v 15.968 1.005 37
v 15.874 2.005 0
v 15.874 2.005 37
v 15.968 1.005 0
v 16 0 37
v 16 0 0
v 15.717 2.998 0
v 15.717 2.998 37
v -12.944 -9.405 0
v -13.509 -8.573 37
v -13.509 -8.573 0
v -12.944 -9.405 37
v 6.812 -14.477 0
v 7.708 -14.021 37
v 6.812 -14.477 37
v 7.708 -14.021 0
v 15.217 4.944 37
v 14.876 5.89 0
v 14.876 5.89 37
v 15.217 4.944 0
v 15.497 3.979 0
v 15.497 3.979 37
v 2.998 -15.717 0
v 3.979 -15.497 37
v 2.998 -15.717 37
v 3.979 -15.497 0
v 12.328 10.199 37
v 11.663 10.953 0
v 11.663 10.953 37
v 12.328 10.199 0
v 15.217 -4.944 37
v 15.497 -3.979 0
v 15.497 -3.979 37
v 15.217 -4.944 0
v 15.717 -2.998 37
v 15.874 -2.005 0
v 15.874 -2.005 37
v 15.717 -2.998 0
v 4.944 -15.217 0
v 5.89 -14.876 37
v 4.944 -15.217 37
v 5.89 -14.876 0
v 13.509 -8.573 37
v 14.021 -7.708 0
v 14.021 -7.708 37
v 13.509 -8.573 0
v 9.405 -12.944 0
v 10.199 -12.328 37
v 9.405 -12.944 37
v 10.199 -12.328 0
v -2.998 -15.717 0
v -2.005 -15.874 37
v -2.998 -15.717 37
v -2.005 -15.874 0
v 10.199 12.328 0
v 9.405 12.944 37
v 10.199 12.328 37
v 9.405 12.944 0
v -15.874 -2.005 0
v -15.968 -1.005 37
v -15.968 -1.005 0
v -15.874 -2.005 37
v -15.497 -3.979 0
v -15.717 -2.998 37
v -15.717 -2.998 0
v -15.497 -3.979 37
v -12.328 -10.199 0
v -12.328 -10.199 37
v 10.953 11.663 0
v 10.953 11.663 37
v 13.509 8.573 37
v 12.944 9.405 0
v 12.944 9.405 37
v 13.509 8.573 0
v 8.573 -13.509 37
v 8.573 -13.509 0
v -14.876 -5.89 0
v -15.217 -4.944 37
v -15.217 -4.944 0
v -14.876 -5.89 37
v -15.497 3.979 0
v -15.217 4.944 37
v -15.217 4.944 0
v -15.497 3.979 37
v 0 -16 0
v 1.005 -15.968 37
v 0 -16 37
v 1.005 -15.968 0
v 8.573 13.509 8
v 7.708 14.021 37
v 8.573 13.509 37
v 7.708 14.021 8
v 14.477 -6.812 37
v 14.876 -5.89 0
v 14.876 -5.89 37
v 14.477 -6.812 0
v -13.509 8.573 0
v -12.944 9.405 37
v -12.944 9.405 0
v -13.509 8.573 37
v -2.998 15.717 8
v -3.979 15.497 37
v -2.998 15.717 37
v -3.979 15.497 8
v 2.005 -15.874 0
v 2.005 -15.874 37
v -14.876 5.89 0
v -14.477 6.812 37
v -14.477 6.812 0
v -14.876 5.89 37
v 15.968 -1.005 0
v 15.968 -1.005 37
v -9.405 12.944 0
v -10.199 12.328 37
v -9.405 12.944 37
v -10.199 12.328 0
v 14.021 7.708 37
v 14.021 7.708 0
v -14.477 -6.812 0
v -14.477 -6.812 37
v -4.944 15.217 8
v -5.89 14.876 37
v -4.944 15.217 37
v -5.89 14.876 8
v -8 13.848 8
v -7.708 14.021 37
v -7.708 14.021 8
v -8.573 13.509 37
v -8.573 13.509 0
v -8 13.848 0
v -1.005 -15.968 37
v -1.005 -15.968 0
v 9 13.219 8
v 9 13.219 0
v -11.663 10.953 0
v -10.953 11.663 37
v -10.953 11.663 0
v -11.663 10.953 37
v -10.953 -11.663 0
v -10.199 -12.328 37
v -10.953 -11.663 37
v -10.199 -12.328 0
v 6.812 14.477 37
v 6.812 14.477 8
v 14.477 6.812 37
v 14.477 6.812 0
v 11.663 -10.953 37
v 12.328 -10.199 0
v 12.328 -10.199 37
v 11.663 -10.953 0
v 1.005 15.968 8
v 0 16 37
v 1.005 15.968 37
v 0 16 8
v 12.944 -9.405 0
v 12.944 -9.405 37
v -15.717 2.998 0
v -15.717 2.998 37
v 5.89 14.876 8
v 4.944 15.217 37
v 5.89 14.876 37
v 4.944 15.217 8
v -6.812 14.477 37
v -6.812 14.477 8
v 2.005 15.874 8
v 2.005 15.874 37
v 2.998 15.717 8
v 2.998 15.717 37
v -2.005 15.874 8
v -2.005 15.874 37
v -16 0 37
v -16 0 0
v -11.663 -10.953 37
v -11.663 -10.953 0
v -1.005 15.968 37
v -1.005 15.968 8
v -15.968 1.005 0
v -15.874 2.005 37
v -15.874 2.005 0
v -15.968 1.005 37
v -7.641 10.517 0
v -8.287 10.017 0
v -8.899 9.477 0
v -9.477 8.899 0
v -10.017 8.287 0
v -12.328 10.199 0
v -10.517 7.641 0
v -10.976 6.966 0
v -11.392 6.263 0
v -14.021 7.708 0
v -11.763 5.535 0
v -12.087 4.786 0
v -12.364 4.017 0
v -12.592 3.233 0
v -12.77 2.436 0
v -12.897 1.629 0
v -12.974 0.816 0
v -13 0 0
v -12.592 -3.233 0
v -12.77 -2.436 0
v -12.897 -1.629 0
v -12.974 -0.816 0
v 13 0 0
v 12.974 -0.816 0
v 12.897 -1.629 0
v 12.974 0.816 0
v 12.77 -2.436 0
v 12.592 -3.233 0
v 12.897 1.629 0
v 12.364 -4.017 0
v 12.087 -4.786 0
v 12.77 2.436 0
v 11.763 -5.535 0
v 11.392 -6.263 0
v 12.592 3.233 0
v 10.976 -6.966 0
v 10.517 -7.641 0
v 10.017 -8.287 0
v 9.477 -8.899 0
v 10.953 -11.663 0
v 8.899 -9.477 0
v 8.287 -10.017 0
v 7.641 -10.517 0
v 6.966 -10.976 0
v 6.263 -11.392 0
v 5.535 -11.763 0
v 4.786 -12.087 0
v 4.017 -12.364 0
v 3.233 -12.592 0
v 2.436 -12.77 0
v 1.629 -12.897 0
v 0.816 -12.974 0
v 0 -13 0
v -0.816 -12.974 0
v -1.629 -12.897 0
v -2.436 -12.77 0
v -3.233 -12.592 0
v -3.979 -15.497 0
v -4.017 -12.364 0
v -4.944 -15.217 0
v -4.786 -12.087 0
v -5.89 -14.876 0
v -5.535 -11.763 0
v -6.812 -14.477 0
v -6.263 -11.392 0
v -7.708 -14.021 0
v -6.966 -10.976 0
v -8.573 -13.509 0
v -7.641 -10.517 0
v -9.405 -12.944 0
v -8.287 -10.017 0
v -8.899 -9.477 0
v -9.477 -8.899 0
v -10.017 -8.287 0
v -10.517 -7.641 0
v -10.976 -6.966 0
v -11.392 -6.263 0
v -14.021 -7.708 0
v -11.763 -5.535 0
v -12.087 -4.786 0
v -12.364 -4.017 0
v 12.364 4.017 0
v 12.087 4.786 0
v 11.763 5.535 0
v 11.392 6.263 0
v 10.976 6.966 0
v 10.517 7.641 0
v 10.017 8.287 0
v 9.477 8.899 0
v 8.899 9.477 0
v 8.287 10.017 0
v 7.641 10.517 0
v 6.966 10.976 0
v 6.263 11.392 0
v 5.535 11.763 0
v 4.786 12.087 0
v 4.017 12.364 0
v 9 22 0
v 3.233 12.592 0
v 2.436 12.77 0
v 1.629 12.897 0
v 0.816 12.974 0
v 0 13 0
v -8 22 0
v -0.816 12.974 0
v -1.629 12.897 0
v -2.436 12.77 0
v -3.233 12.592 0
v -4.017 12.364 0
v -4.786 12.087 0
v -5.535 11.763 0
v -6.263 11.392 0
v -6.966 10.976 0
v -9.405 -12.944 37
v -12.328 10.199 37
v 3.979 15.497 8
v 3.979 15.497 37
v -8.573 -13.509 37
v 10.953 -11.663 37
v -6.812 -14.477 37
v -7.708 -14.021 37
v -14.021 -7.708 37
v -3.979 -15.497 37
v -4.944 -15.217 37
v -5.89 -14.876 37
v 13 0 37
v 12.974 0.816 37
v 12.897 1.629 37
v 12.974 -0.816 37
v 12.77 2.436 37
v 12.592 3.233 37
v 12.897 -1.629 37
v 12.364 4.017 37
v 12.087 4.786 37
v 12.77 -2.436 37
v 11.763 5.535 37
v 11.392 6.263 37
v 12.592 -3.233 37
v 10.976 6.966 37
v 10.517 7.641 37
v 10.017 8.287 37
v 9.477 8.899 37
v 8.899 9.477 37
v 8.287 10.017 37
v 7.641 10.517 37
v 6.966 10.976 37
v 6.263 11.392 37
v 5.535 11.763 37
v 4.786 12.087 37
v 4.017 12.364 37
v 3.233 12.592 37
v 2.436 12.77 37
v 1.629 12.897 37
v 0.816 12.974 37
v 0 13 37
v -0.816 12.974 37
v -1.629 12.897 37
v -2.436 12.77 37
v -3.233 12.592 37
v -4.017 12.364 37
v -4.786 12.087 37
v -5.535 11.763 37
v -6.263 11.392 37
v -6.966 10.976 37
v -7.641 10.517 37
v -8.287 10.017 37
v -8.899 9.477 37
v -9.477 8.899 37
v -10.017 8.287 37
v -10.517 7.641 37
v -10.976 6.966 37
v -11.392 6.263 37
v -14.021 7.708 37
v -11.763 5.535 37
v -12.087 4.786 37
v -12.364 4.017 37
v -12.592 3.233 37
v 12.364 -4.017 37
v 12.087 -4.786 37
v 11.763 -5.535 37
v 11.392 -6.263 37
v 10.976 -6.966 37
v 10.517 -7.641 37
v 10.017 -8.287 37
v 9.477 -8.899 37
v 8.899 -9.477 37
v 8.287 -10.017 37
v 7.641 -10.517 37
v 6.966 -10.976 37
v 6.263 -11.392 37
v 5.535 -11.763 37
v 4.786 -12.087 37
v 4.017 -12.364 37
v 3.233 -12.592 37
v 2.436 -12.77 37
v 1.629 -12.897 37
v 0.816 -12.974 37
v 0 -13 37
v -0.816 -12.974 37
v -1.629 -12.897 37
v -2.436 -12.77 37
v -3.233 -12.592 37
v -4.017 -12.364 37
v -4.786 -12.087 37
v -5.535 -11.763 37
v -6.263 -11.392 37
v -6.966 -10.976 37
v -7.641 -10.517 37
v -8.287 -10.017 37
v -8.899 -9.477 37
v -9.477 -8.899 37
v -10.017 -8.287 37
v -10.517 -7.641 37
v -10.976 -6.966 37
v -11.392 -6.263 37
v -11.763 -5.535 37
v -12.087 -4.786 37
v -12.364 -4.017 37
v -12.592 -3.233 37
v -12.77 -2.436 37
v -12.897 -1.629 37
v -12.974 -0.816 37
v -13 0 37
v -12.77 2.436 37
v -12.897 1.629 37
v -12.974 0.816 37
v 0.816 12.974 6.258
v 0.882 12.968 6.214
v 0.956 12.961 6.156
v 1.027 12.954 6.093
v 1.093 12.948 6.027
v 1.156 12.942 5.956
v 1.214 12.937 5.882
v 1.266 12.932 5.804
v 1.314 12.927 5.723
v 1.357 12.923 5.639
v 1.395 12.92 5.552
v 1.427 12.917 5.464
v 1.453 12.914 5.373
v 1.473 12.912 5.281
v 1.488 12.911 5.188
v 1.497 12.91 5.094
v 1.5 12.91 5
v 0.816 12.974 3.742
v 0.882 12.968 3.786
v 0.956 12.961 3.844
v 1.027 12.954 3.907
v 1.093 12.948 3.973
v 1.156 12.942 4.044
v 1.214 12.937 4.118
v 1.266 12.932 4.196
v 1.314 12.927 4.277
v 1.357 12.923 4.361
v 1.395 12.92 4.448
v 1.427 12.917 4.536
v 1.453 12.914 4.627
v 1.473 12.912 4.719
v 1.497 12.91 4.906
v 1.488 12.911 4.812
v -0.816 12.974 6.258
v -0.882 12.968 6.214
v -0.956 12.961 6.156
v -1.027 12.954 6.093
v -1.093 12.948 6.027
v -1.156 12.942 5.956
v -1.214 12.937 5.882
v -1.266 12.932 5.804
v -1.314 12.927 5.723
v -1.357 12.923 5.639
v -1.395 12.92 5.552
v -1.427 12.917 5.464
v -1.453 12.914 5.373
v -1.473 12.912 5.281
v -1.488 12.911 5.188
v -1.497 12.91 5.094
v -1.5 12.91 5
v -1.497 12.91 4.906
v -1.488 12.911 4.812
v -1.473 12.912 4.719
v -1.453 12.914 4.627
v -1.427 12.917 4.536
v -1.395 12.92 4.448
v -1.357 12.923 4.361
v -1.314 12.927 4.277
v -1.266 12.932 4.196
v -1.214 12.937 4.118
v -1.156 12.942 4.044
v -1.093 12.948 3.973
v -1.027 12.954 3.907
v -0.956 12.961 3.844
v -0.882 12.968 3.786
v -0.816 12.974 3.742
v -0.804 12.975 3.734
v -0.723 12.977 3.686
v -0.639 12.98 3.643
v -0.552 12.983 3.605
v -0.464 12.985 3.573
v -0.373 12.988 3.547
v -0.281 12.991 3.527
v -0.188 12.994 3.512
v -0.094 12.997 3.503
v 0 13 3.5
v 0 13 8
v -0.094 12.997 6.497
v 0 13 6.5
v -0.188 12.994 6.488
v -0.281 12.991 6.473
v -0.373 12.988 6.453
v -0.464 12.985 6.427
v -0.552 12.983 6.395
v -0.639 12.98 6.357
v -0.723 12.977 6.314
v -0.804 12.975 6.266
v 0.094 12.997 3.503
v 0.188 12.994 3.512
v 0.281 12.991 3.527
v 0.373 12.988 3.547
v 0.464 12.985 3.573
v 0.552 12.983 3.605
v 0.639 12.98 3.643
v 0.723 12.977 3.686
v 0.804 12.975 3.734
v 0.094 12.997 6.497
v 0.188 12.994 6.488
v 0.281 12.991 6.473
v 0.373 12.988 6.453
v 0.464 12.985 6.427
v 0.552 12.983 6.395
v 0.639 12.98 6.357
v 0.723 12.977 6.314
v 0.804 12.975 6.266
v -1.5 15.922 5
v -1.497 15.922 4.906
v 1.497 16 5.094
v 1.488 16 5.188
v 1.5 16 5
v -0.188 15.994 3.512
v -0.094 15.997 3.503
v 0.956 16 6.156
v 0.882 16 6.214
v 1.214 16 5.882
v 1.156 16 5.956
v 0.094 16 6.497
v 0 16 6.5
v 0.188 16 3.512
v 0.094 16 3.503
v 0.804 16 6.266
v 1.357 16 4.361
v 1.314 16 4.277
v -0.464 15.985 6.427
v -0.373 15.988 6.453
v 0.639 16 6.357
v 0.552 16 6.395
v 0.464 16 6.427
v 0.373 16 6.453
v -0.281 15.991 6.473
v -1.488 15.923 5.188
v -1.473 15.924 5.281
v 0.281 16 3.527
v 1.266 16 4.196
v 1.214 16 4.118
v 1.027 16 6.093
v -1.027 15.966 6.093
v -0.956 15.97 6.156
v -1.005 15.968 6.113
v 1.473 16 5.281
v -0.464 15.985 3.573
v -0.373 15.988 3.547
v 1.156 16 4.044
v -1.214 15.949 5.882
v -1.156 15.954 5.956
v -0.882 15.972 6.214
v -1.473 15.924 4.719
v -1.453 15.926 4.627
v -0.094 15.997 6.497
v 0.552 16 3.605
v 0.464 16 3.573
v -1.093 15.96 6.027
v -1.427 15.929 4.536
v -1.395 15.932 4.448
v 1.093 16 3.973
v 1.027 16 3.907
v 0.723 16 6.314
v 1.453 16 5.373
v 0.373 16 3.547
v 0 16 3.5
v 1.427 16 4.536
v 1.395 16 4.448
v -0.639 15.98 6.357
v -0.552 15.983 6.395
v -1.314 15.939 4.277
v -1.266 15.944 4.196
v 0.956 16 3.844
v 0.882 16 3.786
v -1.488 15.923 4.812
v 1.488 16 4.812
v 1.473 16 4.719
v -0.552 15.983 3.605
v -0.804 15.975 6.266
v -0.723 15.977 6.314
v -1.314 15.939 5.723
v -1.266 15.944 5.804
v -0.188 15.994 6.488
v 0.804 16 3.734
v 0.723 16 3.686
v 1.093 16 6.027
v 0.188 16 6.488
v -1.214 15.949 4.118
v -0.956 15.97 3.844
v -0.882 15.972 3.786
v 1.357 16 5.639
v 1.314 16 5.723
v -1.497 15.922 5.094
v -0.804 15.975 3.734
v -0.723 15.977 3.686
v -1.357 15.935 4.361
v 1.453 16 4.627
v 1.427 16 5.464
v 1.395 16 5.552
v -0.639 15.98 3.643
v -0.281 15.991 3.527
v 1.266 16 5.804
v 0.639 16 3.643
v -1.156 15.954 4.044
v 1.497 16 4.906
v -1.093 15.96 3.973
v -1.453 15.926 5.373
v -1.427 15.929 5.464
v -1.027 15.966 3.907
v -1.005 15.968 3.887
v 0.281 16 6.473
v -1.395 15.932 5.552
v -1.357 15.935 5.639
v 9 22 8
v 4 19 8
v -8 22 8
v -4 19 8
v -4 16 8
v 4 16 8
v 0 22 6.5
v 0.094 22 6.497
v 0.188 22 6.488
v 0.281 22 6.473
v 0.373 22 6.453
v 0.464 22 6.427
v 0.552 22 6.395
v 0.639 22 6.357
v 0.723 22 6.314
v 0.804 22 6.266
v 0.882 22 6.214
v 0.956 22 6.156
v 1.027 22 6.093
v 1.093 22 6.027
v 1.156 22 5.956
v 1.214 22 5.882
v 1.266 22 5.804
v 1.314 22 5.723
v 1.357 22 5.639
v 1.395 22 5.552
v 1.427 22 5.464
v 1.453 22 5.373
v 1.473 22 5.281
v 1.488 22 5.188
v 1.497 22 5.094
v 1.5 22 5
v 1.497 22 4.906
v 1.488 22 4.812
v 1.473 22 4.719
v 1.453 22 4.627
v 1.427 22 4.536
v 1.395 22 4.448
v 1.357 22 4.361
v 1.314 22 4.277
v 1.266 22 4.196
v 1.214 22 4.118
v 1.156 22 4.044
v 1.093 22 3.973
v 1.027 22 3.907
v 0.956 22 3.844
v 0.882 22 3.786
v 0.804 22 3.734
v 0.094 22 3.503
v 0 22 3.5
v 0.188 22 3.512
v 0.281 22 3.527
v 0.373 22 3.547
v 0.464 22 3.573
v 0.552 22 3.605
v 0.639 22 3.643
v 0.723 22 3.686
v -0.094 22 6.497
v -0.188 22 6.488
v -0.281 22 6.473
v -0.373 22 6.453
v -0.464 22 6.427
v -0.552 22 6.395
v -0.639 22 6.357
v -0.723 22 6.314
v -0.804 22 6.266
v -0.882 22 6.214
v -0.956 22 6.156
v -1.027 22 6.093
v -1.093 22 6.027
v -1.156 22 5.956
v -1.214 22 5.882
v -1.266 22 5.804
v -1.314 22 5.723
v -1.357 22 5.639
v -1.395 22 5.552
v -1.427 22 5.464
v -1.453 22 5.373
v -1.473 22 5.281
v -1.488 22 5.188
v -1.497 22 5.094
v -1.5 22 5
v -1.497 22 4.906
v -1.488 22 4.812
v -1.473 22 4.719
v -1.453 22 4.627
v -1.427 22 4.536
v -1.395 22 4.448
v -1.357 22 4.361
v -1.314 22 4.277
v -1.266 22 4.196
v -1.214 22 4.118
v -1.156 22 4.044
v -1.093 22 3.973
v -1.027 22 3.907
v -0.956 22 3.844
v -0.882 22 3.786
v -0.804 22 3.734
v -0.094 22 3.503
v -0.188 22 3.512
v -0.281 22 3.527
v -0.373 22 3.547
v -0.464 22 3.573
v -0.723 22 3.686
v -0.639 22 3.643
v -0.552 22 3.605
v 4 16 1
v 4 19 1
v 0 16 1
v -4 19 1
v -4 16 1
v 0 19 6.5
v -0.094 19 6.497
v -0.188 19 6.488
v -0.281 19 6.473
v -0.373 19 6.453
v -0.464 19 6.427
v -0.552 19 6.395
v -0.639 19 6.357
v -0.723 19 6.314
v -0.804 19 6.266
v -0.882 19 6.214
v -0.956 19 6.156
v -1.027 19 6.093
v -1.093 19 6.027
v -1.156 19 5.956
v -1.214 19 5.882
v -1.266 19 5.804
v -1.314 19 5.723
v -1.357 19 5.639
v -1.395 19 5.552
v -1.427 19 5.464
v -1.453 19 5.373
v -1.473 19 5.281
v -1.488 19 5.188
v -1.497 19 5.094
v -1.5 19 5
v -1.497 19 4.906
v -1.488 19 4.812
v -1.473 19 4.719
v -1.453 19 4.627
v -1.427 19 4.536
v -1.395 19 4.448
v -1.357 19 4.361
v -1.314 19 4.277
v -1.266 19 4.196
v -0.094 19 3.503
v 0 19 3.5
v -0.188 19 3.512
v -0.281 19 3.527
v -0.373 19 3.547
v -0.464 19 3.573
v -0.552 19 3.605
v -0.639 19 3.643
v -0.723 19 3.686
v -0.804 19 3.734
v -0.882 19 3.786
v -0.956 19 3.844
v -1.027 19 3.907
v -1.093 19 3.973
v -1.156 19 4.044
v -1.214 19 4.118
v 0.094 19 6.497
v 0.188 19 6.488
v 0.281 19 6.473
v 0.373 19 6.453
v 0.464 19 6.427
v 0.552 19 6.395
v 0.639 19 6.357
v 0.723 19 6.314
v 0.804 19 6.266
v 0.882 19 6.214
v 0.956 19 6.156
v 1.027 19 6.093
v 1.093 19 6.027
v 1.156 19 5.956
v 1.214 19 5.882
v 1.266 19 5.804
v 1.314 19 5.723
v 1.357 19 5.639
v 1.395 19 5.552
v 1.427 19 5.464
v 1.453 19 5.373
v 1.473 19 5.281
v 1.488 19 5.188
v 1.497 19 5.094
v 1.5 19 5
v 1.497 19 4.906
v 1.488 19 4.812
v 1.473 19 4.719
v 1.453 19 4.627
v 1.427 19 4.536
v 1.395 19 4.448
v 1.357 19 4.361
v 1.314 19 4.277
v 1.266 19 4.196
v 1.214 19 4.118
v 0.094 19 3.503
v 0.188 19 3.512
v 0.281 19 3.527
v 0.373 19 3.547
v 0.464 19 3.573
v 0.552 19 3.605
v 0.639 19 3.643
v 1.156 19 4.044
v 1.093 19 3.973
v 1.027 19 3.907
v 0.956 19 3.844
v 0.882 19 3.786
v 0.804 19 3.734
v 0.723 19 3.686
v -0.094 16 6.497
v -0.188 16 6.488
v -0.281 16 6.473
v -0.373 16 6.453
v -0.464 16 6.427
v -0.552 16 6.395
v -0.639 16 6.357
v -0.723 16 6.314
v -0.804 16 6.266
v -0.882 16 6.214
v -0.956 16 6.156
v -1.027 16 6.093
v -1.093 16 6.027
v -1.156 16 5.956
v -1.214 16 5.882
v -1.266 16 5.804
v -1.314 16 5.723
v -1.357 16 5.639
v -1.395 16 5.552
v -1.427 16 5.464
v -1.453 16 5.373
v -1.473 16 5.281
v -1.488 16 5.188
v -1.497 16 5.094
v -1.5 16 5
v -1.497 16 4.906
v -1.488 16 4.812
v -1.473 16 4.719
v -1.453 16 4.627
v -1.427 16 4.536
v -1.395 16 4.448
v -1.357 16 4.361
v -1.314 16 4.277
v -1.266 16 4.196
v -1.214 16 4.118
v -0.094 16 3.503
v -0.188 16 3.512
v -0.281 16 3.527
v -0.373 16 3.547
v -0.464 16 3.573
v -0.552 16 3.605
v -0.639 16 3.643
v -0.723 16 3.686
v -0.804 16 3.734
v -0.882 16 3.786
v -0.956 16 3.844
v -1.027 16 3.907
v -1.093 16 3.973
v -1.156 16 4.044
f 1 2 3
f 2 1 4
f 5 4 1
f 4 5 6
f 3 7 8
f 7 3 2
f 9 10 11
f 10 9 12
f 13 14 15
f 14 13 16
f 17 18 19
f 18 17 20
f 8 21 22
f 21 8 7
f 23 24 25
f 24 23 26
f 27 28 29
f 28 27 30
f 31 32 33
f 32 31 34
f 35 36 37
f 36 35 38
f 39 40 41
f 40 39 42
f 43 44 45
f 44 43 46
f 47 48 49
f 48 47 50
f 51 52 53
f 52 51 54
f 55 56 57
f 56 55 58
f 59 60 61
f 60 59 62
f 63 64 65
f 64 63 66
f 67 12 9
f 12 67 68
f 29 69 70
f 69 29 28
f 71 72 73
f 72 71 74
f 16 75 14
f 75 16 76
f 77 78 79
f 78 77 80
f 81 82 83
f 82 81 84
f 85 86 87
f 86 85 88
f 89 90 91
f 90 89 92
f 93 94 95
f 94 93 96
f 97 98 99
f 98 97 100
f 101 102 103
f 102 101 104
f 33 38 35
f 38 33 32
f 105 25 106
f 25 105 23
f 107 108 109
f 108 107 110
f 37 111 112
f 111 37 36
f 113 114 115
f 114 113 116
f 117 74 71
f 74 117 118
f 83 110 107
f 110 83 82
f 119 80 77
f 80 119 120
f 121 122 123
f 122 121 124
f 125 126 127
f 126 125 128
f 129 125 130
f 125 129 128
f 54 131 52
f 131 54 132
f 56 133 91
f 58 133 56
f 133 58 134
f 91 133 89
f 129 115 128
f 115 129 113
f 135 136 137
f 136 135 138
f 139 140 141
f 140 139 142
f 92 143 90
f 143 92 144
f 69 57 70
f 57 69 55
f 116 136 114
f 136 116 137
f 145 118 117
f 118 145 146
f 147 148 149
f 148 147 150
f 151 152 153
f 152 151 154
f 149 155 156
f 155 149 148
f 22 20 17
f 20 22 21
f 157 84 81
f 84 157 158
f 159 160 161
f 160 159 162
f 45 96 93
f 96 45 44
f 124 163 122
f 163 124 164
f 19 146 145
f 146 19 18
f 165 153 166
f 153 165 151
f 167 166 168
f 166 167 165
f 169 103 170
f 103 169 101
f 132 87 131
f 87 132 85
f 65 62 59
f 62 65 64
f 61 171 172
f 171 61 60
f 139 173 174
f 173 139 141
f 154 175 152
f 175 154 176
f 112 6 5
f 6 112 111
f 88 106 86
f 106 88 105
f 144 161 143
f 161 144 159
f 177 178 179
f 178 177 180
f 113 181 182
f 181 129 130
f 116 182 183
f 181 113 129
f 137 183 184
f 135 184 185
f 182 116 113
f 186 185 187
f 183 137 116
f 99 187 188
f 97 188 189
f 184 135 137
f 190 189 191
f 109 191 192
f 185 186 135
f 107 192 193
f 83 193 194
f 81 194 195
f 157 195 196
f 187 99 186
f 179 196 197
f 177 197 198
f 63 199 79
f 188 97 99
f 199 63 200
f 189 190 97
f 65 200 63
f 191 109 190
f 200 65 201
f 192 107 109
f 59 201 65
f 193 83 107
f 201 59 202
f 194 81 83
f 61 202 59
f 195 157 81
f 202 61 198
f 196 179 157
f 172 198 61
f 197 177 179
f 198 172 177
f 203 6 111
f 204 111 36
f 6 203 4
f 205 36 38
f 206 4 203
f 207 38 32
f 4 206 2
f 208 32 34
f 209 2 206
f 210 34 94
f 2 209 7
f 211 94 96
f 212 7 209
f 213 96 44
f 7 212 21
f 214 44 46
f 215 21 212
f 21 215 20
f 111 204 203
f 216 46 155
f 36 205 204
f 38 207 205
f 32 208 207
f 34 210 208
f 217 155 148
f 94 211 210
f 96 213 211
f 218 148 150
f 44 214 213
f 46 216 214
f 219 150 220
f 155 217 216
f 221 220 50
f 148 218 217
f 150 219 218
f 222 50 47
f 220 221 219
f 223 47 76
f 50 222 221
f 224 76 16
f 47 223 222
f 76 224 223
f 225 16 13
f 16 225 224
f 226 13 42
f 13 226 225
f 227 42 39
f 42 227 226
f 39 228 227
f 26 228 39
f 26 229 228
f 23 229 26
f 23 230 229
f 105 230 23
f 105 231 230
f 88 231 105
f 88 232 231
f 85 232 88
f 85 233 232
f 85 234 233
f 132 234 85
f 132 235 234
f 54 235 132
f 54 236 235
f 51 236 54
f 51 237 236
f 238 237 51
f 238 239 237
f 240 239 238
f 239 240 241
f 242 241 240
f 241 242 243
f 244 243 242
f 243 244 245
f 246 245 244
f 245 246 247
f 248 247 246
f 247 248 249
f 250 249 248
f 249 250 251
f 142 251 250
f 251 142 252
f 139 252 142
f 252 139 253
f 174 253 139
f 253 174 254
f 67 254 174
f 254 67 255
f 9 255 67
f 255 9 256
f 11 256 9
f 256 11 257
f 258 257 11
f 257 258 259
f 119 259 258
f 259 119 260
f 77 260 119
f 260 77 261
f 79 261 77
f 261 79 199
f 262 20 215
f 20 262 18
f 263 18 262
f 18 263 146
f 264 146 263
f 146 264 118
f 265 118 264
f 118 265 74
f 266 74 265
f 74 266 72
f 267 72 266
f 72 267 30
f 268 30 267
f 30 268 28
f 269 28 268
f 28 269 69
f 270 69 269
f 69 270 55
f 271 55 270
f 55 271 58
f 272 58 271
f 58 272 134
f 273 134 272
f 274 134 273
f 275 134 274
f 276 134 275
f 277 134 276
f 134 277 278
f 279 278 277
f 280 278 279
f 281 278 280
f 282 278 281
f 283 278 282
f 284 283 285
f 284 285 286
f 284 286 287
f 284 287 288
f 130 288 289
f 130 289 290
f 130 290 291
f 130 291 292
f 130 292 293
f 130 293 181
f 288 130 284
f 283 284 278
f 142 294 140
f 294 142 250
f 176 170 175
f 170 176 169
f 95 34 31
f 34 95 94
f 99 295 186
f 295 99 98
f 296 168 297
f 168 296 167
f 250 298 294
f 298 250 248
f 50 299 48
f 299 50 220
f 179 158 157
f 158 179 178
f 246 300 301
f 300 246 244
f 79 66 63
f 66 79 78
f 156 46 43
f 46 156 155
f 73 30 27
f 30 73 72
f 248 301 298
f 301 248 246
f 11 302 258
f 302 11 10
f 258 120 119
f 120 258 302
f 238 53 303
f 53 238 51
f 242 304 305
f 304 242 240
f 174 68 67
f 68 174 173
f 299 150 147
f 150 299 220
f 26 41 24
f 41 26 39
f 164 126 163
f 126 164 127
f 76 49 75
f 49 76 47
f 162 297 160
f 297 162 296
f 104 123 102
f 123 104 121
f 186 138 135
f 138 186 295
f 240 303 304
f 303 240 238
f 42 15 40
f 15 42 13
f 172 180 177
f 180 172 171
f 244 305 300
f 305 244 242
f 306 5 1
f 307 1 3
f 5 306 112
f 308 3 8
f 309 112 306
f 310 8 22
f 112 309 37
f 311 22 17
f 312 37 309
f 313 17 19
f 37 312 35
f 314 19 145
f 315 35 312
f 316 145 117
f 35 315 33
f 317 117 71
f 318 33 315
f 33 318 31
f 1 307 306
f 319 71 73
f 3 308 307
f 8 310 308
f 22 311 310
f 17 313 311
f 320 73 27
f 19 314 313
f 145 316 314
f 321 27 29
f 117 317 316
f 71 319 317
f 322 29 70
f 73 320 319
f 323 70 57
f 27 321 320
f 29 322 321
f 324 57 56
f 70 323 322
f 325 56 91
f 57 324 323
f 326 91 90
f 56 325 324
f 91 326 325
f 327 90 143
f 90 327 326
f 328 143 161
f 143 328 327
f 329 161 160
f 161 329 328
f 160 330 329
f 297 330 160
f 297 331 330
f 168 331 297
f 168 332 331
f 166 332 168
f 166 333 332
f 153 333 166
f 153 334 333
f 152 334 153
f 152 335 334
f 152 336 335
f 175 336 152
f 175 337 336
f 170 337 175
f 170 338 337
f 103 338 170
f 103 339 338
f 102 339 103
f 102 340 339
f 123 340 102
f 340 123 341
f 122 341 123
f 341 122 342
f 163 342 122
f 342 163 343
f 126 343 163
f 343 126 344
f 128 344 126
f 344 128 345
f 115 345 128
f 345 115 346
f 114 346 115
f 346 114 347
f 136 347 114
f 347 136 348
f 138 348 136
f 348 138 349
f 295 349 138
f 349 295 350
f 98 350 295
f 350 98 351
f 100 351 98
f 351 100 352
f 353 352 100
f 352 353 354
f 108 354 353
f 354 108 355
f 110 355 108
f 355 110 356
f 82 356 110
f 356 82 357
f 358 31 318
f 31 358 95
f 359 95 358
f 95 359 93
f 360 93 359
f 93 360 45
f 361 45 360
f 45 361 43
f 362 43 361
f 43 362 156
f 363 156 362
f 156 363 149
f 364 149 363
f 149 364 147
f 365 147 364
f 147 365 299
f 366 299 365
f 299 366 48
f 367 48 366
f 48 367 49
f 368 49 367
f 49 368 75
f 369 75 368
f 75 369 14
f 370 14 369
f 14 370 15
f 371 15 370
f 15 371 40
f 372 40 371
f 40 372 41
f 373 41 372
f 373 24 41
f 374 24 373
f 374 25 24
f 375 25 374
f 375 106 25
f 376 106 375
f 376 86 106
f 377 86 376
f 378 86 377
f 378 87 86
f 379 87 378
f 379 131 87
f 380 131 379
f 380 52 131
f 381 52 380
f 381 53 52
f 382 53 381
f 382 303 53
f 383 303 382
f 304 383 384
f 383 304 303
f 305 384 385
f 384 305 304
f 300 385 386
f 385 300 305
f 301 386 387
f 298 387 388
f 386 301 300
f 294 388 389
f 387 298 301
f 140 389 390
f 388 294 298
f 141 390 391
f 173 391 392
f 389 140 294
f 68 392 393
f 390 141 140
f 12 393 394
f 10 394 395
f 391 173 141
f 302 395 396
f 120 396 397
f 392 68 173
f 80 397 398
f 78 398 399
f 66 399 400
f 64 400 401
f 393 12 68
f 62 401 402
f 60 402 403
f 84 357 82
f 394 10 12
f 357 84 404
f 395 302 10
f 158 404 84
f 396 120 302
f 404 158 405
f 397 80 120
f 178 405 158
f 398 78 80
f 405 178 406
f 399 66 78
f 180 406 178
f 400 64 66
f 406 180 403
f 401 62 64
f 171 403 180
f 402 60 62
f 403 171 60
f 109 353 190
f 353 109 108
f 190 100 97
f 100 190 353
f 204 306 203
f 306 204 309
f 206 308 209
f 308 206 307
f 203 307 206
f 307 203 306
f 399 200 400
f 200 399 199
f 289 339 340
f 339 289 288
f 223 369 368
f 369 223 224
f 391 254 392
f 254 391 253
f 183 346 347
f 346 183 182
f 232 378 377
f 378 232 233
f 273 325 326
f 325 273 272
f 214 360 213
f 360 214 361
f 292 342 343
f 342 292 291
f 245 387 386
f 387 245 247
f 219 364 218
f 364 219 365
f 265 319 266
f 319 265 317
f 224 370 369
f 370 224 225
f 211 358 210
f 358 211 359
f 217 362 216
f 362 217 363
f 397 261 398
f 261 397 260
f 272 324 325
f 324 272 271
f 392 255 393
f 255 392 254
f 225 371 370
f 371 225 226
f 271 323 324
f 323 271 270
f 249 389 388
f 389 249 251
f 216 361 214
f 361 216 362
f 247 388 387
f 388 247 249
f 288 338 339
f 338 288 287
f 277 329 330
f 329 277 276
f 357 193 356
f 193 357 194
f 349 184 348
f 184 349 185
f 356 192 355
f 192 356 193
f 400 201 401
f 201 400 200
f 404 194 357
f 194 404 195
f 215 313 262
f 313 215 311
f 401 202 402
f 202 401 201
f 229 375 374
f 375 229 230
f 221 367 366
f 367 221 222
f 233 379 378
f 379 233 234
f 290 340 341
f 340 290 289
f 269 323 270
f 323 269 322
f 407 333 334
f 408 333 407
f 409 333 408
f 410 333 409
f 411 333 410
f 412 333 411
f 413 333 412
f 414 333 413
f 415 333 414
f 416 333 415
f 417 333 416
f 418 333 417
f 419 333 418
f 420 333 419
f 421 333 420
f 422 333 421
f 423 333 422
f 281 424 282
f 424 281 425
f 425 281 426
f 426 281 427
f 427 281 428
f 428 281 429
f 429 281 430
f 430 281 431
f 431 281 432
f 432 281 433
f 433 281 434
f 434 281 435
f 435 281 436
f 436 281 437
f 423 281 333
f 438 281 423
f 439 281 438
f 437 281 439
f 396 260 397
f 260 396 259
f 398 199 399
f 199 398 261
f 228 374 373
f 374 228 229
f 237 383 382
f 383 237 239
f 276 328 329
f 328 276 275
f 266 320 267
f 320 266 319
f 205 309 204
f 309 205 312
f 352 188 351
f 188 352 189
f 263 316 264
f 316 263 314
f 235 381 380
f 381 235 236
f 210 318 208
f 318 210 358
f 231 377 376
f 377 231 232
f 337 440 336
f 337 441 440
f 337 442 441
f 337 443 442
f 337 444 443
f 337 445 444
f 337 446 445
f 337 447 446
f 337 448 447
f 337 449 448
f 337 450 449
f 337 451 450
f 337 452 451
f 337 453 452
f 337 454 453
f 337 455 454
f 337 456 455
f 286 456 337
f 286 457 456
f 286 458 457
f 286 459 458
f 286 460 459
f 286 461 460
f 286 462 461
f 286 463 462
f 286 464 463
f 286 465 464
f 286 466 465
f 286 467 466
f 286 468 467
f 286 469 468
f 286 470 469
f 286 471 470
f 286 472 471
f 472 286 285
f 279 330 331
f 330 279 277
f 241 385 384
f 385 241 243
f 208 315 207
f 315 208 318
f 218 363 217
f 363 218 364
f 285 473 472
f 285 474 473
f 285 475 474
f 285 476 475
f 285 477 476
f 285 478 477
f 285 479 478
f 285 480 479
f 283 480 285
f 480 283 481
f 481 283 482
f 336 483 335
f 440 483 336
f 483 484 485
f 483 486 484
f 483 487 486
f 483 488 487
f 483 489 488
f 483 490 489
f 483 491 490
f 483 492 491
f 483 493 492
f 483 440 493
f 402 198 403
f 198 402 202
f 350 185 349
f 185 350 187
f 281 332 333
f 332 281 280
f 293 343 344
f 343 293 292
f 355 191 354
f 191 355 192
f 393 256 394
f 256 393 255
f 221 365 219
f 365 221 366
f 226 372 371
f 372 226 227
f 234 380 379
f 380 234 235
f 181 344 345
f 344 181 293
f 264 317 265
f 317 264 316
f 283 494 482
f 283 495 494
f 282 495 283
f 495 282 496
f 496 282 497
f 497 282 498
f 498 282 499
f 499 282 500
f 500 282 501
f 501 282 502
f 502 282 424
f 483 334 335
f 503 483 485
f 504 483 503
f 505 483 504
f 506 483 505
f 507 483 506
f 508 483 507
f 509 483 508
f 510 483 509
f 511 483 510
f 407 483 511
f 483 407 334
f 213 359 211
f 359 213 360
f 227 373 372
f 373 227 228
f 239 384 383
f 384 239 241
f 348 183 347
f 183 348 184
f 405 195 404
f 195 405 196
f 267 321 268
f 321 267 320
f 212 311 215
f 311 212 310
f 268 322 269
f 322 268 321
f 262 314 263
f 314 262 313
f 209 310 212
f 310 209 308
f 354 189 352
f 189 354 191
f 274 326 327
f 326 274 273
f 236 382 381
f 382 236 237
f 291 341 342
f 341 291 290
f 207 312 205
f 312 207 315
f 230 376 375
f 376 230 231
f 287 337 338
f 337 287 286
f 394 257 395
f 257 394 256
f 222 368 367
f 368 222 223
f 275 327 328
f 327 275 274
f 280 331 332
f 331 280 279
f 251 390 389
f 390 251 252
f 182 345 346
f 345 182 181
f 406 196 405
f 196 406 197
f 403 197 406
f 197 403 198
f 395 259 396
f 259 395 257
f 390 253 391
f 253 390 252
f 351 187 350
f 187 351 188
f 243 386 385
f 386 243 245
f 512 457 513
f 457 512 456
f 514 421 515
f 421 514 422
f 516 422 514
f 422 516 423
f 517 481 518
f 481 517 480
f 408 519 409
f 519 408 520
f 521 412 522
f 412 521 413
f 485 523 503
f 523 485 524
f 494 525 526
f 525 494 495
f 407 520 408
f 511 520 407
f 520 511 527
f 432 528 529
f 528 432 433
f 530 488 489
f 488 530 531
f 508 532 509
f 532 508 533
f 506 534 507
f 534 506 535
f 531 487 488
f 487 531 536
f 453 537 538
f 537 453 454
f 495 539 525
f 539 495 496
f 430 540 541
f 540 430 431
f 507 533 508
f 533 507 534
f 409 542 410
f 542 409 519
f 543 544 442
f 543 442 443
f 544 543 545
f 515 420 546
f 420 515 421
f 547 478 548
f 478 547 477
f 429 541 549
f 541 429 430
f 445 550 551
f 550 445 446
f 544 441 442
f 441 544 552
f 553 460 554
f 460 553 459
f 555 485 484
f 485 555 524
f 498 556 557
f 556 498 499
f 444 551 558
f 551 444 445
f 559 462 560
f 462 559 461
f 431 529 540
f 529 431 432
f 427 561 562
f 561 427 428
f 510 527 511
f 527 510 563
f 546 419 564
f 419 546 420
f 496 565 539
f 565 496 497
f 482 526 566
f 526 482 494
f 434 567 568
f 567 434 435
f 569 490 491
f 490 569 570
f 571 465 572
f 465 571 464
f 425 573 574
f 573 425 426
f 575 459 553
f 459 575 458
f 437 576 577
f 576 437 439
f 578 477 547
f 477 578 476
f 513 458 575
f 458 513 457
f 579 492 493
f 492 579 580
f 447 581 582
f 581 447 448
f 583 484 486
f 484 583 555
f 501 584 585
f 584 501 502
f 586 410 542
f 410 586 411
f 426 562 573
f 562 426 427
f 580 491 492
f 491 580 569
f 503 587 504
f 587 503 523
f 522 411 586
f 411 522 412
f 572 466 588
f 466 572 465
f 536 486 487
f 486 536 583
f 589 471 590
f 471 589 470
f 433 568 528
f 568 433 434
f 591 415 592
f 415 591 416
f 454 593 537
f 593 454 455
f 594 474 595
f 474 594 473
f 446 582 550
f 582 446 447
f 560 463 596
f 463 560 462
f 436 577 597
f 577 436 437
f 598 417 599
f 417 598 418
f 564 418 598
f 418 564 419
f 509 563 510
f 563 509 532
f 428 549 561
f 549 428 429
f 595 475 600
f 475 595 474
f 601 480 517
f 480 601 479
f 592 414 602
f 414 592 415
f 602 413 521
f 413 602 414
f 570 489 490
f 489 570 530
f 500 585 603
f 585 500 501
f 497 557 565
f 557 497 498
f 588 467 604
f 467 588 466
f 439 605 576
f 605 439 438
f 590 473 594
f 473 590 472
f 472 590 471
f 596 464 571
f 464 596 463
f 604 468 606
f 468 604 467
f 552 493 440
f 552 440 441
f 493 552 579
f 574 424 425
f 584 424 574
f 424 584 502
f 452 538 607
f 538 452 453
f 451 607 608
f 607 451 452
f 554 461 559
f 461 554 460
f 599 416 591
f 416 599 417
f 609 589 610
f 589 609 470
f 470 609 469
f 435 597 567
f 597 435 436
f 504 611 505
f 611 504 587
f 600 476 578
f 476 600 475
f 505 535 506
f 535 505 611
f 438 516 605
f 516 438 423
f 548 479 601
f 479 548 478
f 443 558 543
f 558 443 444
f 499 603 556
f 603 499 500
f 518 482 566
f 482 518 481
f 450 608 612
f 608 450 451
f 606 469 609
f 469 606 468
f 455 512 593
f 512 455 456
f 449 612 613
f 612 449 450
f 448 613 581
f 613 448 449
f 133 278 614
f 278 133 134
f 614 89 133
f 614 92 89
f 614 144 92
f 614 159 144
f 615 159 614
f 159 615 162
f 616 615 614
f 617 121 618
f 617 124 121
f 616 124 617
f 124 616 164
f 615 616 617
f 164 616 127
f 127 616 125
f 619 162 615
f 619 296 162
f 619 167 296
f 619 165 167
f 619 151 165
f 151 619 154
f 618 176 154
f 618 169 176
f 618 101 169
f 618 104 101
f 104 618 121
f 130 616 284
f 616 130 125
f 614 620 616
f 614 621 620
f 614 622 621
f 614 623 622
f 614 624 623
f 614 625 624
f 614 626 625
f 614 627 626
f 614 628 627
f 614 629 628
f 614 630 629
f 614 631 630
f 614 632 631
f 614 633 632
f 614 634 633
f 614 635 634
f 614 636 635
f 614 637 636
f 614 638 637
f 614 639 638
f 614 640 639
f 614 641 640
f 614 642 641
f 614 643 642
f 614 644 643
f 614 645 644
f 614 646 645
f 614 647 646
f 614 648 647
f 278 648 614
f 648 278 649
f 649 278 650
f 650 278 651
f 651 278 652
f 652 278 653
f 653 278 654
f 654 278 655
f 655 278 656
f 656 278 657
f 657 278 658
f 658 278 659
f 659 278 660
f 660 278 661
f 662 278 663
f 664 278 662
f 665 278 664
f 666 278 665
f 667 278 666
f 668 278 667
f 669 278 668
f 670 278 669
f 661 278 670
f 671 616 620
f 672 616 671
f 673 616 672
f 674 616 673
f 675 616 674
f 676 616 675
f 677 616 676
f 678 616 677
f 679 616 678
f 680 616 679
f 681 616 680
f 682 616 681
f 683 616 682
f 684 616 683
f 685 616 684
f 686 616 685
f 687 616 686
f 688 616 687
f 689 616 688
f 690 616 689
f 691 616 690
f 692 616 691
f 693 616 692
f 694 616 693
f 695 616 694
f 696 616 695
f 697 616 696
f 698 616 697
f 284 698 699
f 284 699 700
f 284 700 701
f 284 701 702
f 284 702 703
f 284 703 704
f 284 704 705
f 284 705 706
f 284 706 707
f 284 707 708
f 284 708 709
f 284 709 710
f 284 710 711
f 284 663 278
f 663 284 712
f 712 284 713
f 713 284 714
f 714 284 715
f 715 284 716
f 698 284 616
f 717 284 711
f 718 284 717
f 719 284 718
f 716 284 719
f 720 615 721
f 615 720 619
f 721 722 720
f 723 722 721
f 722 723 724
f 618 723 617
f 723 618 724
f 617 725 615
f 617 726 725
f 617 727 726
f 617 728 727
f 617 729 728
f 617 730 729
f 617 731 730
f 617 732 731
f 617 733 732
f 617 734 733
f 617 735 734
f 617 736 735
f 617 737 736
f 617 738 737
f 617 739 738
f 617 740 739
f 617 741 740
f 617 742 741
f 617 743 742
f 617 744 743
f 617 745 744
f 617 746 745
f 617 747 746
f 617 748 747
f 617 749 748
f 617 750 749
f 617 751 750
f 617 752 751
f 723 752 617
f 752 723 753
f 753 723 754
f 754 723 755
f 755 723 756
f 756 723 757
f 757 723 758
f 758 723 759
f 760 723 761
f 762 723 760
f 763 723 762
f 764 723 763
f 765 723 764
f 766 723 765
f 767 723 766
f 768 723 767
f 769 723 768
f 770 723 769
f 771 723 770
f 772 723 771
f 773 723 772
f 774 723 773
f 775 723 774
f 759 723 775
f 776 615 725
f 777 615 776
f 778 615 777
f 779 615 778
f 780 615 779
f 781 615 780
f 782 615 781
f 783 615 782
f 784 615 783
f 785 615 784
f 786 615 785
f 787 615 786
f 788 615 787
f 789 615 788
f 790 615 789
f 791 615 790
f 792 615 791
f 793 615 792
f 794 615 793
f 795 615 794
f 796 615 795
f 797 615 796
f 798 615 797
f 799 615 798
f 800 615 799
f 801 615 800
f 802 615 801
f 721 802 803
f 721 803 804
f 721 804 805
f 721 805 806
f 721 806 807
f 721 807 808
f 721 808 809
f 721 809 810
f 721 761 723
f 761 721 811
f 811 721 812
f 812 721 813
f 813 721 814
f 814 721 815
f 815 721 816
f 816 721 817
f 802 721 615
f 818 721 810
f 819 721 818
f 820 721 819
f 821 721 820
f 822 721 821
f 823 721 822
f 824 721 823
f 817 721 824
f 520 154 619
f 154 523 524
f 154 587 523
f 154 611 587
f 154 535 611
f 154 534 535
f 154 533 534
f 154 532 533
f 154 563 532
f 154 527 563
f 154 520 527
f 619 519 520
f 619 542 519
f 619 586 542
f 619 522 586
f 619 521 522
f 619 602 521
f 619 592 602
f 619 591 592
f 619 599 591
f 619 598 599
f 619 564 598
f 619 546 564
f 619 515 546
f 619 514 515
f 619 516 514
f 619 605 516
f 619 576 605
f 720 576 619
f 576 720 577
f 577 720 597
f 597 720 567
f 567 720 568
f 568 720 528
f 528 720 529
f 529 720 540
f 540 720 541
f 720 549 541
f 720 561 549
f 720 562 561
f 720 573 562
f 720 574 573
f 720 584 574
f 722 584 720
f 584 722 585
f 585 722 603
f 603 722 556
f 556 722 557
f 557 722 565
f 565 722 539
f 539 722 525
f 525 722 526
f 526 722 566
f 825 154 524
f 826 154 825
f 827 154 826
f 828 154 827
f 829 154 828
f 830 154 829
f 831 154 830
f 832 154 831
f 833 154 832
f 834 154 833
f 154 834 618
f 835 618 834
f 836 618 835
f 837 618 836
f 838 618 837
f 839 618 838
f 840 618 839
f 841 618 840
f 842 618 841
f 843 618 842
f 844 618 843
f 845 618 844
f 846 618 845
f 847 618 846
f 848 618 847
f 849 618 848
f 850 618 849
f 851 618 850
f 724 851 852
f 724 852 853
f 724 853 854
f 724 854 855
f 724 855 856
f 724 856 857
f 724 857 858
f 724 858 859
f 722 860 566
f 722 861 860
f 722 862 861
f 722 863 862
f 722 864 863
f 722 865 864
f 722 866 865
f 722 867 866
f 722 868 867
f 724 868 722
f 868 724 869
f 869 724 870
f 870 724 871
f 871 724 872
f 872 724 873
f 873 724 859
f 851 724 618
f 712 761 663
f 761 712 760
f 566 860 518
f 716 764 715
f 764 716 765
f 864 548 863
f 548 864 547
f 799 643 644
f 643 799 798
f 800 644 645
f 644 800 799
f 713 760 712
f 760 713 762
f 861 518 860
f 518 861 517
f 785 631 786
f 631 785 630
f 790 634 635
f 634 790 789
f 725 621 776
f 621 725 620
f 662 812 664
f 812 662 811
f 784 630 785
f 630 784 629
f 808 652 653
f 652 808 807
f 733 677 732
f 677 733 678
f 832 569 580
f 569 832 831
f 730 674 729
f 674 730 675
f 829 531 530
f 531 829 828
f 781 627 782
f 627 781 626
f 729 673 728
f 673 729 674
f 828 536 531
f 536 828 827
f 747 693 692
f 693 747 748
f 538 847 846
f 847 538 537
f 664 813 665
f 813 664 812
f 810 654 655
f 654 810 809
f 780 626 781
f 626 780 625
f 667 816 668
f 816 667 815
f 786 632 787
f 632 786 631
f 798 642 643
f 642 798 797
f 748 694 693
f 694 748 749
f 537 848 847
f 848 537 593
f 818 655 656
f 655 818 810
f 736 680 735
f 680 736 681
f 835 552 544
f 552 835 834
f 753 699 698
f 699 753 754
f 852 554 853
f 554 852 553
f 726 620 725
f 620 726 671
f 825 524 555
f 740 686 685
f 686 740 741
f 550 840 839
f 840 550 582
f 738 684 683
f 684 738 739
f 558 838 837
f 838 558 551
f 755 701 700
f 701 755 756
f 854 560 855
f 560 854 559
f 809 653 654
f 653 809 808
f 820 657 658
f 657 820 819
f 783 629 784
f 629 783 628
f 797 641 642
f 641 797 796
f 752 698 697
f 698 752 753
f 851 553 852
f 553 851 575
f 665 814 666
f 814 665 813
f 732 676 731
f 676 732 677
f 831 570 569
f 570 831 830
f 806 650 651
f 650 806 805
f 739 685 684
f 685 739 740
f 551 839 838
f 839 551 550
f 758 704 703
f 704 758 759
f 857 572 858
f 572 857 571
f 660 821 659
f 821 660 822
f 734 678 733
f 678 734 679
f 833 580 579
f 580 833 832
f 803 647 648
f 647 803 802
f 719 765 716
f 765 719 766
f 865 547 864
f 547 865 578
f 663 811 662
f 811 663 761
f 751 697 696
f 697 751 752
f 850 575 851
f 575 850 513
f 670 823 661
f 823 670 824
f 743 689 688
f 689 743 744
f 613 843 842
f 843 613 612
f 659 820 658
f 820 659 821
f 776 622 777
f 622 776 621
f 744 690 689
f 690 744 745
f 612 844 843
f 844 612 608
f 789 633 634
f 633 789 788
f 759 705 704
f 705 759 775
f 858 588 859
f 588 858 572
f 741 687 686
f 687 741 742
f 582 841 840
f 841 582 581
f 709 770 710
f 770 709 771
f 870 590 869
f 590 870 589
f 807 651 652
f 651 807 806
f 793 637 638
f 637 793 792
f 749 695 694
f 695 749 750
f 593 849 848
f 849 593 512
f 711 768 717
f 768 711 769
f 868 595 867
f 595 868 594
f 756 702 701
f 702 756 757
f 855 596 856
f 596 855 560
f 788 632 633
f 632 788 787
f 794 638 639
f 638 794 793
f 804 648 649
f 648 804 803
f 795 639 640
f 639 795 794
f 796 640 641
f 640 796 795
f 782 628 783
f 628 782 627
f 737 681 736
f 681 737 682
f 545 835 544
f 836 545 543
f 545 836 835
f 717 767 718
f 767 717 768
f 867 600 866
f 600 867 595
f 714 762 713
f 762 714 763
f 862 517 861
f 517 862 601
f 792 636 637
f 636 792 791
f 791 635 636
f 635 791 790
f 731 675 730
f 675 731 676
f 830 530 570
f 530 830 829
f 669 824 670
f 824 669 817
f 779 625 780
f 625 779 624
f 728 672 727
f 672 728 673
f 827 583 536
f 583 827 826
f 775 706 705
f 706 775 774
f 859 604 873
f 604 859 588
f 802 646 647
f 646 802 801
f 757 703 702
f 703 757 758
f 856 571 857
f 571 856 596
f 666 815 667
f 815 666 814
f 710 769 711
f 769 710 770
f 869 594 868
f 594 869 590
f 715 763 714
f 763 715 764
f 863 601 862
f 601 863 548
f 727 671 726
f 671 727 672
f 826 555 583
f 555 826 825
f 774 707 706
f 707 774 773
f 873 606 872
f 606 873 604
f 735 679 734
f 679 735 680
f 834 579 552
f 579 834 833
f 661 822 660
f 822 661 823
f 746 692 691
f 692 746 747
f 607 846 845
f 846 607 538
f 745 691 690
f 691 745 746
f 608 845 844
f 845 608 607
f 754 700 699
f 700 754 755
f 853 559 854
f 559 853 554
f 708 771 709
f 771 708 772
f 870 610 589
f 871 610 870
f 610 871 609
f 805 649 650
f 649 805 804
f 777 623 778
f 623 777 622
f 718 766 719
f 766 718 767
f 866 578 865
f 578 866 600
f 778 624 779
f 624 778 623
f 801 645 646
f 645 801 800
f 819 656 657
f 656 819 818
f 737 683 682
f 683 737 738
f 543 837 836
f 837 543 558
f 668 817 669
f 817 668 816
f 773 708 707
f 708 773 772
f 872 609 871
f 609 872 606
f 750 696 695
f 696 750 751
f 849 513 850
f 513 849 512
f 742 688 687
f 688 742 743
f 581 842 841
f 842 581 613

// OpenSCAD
diameter_interne = 26;
diameter_externe = 32;
height_boule_plateau = 10;
height_max = 47;
$fn = 100;

height = height_max - height_boule_plateau;

module support(){
	difference(){
		cylinder(height,d=diameter_externe);
		translate([0,0,-10]){
			cylinder(height+20,d=diameter_interne);
		}
	}
}

module serre_bille(){
	difference(){
		cube([17,9,8]);
		translate([4,3,1]){
			cube([8,3,8]);
		}

		translate([8,12,5]){
			rotate([90,0]){
				cylinder(h=22,d=3);
			}
		}
	}
}


union(){
	difference(){
		support();
		translate([-6,7,0]){
			translate([6,10,5]){
				rotate([90,0]){
					cylinder(h=20,d=3);
				}
			}
		}
	}

	translate([-8,13,0]){
		serre_bille();
	}
}
